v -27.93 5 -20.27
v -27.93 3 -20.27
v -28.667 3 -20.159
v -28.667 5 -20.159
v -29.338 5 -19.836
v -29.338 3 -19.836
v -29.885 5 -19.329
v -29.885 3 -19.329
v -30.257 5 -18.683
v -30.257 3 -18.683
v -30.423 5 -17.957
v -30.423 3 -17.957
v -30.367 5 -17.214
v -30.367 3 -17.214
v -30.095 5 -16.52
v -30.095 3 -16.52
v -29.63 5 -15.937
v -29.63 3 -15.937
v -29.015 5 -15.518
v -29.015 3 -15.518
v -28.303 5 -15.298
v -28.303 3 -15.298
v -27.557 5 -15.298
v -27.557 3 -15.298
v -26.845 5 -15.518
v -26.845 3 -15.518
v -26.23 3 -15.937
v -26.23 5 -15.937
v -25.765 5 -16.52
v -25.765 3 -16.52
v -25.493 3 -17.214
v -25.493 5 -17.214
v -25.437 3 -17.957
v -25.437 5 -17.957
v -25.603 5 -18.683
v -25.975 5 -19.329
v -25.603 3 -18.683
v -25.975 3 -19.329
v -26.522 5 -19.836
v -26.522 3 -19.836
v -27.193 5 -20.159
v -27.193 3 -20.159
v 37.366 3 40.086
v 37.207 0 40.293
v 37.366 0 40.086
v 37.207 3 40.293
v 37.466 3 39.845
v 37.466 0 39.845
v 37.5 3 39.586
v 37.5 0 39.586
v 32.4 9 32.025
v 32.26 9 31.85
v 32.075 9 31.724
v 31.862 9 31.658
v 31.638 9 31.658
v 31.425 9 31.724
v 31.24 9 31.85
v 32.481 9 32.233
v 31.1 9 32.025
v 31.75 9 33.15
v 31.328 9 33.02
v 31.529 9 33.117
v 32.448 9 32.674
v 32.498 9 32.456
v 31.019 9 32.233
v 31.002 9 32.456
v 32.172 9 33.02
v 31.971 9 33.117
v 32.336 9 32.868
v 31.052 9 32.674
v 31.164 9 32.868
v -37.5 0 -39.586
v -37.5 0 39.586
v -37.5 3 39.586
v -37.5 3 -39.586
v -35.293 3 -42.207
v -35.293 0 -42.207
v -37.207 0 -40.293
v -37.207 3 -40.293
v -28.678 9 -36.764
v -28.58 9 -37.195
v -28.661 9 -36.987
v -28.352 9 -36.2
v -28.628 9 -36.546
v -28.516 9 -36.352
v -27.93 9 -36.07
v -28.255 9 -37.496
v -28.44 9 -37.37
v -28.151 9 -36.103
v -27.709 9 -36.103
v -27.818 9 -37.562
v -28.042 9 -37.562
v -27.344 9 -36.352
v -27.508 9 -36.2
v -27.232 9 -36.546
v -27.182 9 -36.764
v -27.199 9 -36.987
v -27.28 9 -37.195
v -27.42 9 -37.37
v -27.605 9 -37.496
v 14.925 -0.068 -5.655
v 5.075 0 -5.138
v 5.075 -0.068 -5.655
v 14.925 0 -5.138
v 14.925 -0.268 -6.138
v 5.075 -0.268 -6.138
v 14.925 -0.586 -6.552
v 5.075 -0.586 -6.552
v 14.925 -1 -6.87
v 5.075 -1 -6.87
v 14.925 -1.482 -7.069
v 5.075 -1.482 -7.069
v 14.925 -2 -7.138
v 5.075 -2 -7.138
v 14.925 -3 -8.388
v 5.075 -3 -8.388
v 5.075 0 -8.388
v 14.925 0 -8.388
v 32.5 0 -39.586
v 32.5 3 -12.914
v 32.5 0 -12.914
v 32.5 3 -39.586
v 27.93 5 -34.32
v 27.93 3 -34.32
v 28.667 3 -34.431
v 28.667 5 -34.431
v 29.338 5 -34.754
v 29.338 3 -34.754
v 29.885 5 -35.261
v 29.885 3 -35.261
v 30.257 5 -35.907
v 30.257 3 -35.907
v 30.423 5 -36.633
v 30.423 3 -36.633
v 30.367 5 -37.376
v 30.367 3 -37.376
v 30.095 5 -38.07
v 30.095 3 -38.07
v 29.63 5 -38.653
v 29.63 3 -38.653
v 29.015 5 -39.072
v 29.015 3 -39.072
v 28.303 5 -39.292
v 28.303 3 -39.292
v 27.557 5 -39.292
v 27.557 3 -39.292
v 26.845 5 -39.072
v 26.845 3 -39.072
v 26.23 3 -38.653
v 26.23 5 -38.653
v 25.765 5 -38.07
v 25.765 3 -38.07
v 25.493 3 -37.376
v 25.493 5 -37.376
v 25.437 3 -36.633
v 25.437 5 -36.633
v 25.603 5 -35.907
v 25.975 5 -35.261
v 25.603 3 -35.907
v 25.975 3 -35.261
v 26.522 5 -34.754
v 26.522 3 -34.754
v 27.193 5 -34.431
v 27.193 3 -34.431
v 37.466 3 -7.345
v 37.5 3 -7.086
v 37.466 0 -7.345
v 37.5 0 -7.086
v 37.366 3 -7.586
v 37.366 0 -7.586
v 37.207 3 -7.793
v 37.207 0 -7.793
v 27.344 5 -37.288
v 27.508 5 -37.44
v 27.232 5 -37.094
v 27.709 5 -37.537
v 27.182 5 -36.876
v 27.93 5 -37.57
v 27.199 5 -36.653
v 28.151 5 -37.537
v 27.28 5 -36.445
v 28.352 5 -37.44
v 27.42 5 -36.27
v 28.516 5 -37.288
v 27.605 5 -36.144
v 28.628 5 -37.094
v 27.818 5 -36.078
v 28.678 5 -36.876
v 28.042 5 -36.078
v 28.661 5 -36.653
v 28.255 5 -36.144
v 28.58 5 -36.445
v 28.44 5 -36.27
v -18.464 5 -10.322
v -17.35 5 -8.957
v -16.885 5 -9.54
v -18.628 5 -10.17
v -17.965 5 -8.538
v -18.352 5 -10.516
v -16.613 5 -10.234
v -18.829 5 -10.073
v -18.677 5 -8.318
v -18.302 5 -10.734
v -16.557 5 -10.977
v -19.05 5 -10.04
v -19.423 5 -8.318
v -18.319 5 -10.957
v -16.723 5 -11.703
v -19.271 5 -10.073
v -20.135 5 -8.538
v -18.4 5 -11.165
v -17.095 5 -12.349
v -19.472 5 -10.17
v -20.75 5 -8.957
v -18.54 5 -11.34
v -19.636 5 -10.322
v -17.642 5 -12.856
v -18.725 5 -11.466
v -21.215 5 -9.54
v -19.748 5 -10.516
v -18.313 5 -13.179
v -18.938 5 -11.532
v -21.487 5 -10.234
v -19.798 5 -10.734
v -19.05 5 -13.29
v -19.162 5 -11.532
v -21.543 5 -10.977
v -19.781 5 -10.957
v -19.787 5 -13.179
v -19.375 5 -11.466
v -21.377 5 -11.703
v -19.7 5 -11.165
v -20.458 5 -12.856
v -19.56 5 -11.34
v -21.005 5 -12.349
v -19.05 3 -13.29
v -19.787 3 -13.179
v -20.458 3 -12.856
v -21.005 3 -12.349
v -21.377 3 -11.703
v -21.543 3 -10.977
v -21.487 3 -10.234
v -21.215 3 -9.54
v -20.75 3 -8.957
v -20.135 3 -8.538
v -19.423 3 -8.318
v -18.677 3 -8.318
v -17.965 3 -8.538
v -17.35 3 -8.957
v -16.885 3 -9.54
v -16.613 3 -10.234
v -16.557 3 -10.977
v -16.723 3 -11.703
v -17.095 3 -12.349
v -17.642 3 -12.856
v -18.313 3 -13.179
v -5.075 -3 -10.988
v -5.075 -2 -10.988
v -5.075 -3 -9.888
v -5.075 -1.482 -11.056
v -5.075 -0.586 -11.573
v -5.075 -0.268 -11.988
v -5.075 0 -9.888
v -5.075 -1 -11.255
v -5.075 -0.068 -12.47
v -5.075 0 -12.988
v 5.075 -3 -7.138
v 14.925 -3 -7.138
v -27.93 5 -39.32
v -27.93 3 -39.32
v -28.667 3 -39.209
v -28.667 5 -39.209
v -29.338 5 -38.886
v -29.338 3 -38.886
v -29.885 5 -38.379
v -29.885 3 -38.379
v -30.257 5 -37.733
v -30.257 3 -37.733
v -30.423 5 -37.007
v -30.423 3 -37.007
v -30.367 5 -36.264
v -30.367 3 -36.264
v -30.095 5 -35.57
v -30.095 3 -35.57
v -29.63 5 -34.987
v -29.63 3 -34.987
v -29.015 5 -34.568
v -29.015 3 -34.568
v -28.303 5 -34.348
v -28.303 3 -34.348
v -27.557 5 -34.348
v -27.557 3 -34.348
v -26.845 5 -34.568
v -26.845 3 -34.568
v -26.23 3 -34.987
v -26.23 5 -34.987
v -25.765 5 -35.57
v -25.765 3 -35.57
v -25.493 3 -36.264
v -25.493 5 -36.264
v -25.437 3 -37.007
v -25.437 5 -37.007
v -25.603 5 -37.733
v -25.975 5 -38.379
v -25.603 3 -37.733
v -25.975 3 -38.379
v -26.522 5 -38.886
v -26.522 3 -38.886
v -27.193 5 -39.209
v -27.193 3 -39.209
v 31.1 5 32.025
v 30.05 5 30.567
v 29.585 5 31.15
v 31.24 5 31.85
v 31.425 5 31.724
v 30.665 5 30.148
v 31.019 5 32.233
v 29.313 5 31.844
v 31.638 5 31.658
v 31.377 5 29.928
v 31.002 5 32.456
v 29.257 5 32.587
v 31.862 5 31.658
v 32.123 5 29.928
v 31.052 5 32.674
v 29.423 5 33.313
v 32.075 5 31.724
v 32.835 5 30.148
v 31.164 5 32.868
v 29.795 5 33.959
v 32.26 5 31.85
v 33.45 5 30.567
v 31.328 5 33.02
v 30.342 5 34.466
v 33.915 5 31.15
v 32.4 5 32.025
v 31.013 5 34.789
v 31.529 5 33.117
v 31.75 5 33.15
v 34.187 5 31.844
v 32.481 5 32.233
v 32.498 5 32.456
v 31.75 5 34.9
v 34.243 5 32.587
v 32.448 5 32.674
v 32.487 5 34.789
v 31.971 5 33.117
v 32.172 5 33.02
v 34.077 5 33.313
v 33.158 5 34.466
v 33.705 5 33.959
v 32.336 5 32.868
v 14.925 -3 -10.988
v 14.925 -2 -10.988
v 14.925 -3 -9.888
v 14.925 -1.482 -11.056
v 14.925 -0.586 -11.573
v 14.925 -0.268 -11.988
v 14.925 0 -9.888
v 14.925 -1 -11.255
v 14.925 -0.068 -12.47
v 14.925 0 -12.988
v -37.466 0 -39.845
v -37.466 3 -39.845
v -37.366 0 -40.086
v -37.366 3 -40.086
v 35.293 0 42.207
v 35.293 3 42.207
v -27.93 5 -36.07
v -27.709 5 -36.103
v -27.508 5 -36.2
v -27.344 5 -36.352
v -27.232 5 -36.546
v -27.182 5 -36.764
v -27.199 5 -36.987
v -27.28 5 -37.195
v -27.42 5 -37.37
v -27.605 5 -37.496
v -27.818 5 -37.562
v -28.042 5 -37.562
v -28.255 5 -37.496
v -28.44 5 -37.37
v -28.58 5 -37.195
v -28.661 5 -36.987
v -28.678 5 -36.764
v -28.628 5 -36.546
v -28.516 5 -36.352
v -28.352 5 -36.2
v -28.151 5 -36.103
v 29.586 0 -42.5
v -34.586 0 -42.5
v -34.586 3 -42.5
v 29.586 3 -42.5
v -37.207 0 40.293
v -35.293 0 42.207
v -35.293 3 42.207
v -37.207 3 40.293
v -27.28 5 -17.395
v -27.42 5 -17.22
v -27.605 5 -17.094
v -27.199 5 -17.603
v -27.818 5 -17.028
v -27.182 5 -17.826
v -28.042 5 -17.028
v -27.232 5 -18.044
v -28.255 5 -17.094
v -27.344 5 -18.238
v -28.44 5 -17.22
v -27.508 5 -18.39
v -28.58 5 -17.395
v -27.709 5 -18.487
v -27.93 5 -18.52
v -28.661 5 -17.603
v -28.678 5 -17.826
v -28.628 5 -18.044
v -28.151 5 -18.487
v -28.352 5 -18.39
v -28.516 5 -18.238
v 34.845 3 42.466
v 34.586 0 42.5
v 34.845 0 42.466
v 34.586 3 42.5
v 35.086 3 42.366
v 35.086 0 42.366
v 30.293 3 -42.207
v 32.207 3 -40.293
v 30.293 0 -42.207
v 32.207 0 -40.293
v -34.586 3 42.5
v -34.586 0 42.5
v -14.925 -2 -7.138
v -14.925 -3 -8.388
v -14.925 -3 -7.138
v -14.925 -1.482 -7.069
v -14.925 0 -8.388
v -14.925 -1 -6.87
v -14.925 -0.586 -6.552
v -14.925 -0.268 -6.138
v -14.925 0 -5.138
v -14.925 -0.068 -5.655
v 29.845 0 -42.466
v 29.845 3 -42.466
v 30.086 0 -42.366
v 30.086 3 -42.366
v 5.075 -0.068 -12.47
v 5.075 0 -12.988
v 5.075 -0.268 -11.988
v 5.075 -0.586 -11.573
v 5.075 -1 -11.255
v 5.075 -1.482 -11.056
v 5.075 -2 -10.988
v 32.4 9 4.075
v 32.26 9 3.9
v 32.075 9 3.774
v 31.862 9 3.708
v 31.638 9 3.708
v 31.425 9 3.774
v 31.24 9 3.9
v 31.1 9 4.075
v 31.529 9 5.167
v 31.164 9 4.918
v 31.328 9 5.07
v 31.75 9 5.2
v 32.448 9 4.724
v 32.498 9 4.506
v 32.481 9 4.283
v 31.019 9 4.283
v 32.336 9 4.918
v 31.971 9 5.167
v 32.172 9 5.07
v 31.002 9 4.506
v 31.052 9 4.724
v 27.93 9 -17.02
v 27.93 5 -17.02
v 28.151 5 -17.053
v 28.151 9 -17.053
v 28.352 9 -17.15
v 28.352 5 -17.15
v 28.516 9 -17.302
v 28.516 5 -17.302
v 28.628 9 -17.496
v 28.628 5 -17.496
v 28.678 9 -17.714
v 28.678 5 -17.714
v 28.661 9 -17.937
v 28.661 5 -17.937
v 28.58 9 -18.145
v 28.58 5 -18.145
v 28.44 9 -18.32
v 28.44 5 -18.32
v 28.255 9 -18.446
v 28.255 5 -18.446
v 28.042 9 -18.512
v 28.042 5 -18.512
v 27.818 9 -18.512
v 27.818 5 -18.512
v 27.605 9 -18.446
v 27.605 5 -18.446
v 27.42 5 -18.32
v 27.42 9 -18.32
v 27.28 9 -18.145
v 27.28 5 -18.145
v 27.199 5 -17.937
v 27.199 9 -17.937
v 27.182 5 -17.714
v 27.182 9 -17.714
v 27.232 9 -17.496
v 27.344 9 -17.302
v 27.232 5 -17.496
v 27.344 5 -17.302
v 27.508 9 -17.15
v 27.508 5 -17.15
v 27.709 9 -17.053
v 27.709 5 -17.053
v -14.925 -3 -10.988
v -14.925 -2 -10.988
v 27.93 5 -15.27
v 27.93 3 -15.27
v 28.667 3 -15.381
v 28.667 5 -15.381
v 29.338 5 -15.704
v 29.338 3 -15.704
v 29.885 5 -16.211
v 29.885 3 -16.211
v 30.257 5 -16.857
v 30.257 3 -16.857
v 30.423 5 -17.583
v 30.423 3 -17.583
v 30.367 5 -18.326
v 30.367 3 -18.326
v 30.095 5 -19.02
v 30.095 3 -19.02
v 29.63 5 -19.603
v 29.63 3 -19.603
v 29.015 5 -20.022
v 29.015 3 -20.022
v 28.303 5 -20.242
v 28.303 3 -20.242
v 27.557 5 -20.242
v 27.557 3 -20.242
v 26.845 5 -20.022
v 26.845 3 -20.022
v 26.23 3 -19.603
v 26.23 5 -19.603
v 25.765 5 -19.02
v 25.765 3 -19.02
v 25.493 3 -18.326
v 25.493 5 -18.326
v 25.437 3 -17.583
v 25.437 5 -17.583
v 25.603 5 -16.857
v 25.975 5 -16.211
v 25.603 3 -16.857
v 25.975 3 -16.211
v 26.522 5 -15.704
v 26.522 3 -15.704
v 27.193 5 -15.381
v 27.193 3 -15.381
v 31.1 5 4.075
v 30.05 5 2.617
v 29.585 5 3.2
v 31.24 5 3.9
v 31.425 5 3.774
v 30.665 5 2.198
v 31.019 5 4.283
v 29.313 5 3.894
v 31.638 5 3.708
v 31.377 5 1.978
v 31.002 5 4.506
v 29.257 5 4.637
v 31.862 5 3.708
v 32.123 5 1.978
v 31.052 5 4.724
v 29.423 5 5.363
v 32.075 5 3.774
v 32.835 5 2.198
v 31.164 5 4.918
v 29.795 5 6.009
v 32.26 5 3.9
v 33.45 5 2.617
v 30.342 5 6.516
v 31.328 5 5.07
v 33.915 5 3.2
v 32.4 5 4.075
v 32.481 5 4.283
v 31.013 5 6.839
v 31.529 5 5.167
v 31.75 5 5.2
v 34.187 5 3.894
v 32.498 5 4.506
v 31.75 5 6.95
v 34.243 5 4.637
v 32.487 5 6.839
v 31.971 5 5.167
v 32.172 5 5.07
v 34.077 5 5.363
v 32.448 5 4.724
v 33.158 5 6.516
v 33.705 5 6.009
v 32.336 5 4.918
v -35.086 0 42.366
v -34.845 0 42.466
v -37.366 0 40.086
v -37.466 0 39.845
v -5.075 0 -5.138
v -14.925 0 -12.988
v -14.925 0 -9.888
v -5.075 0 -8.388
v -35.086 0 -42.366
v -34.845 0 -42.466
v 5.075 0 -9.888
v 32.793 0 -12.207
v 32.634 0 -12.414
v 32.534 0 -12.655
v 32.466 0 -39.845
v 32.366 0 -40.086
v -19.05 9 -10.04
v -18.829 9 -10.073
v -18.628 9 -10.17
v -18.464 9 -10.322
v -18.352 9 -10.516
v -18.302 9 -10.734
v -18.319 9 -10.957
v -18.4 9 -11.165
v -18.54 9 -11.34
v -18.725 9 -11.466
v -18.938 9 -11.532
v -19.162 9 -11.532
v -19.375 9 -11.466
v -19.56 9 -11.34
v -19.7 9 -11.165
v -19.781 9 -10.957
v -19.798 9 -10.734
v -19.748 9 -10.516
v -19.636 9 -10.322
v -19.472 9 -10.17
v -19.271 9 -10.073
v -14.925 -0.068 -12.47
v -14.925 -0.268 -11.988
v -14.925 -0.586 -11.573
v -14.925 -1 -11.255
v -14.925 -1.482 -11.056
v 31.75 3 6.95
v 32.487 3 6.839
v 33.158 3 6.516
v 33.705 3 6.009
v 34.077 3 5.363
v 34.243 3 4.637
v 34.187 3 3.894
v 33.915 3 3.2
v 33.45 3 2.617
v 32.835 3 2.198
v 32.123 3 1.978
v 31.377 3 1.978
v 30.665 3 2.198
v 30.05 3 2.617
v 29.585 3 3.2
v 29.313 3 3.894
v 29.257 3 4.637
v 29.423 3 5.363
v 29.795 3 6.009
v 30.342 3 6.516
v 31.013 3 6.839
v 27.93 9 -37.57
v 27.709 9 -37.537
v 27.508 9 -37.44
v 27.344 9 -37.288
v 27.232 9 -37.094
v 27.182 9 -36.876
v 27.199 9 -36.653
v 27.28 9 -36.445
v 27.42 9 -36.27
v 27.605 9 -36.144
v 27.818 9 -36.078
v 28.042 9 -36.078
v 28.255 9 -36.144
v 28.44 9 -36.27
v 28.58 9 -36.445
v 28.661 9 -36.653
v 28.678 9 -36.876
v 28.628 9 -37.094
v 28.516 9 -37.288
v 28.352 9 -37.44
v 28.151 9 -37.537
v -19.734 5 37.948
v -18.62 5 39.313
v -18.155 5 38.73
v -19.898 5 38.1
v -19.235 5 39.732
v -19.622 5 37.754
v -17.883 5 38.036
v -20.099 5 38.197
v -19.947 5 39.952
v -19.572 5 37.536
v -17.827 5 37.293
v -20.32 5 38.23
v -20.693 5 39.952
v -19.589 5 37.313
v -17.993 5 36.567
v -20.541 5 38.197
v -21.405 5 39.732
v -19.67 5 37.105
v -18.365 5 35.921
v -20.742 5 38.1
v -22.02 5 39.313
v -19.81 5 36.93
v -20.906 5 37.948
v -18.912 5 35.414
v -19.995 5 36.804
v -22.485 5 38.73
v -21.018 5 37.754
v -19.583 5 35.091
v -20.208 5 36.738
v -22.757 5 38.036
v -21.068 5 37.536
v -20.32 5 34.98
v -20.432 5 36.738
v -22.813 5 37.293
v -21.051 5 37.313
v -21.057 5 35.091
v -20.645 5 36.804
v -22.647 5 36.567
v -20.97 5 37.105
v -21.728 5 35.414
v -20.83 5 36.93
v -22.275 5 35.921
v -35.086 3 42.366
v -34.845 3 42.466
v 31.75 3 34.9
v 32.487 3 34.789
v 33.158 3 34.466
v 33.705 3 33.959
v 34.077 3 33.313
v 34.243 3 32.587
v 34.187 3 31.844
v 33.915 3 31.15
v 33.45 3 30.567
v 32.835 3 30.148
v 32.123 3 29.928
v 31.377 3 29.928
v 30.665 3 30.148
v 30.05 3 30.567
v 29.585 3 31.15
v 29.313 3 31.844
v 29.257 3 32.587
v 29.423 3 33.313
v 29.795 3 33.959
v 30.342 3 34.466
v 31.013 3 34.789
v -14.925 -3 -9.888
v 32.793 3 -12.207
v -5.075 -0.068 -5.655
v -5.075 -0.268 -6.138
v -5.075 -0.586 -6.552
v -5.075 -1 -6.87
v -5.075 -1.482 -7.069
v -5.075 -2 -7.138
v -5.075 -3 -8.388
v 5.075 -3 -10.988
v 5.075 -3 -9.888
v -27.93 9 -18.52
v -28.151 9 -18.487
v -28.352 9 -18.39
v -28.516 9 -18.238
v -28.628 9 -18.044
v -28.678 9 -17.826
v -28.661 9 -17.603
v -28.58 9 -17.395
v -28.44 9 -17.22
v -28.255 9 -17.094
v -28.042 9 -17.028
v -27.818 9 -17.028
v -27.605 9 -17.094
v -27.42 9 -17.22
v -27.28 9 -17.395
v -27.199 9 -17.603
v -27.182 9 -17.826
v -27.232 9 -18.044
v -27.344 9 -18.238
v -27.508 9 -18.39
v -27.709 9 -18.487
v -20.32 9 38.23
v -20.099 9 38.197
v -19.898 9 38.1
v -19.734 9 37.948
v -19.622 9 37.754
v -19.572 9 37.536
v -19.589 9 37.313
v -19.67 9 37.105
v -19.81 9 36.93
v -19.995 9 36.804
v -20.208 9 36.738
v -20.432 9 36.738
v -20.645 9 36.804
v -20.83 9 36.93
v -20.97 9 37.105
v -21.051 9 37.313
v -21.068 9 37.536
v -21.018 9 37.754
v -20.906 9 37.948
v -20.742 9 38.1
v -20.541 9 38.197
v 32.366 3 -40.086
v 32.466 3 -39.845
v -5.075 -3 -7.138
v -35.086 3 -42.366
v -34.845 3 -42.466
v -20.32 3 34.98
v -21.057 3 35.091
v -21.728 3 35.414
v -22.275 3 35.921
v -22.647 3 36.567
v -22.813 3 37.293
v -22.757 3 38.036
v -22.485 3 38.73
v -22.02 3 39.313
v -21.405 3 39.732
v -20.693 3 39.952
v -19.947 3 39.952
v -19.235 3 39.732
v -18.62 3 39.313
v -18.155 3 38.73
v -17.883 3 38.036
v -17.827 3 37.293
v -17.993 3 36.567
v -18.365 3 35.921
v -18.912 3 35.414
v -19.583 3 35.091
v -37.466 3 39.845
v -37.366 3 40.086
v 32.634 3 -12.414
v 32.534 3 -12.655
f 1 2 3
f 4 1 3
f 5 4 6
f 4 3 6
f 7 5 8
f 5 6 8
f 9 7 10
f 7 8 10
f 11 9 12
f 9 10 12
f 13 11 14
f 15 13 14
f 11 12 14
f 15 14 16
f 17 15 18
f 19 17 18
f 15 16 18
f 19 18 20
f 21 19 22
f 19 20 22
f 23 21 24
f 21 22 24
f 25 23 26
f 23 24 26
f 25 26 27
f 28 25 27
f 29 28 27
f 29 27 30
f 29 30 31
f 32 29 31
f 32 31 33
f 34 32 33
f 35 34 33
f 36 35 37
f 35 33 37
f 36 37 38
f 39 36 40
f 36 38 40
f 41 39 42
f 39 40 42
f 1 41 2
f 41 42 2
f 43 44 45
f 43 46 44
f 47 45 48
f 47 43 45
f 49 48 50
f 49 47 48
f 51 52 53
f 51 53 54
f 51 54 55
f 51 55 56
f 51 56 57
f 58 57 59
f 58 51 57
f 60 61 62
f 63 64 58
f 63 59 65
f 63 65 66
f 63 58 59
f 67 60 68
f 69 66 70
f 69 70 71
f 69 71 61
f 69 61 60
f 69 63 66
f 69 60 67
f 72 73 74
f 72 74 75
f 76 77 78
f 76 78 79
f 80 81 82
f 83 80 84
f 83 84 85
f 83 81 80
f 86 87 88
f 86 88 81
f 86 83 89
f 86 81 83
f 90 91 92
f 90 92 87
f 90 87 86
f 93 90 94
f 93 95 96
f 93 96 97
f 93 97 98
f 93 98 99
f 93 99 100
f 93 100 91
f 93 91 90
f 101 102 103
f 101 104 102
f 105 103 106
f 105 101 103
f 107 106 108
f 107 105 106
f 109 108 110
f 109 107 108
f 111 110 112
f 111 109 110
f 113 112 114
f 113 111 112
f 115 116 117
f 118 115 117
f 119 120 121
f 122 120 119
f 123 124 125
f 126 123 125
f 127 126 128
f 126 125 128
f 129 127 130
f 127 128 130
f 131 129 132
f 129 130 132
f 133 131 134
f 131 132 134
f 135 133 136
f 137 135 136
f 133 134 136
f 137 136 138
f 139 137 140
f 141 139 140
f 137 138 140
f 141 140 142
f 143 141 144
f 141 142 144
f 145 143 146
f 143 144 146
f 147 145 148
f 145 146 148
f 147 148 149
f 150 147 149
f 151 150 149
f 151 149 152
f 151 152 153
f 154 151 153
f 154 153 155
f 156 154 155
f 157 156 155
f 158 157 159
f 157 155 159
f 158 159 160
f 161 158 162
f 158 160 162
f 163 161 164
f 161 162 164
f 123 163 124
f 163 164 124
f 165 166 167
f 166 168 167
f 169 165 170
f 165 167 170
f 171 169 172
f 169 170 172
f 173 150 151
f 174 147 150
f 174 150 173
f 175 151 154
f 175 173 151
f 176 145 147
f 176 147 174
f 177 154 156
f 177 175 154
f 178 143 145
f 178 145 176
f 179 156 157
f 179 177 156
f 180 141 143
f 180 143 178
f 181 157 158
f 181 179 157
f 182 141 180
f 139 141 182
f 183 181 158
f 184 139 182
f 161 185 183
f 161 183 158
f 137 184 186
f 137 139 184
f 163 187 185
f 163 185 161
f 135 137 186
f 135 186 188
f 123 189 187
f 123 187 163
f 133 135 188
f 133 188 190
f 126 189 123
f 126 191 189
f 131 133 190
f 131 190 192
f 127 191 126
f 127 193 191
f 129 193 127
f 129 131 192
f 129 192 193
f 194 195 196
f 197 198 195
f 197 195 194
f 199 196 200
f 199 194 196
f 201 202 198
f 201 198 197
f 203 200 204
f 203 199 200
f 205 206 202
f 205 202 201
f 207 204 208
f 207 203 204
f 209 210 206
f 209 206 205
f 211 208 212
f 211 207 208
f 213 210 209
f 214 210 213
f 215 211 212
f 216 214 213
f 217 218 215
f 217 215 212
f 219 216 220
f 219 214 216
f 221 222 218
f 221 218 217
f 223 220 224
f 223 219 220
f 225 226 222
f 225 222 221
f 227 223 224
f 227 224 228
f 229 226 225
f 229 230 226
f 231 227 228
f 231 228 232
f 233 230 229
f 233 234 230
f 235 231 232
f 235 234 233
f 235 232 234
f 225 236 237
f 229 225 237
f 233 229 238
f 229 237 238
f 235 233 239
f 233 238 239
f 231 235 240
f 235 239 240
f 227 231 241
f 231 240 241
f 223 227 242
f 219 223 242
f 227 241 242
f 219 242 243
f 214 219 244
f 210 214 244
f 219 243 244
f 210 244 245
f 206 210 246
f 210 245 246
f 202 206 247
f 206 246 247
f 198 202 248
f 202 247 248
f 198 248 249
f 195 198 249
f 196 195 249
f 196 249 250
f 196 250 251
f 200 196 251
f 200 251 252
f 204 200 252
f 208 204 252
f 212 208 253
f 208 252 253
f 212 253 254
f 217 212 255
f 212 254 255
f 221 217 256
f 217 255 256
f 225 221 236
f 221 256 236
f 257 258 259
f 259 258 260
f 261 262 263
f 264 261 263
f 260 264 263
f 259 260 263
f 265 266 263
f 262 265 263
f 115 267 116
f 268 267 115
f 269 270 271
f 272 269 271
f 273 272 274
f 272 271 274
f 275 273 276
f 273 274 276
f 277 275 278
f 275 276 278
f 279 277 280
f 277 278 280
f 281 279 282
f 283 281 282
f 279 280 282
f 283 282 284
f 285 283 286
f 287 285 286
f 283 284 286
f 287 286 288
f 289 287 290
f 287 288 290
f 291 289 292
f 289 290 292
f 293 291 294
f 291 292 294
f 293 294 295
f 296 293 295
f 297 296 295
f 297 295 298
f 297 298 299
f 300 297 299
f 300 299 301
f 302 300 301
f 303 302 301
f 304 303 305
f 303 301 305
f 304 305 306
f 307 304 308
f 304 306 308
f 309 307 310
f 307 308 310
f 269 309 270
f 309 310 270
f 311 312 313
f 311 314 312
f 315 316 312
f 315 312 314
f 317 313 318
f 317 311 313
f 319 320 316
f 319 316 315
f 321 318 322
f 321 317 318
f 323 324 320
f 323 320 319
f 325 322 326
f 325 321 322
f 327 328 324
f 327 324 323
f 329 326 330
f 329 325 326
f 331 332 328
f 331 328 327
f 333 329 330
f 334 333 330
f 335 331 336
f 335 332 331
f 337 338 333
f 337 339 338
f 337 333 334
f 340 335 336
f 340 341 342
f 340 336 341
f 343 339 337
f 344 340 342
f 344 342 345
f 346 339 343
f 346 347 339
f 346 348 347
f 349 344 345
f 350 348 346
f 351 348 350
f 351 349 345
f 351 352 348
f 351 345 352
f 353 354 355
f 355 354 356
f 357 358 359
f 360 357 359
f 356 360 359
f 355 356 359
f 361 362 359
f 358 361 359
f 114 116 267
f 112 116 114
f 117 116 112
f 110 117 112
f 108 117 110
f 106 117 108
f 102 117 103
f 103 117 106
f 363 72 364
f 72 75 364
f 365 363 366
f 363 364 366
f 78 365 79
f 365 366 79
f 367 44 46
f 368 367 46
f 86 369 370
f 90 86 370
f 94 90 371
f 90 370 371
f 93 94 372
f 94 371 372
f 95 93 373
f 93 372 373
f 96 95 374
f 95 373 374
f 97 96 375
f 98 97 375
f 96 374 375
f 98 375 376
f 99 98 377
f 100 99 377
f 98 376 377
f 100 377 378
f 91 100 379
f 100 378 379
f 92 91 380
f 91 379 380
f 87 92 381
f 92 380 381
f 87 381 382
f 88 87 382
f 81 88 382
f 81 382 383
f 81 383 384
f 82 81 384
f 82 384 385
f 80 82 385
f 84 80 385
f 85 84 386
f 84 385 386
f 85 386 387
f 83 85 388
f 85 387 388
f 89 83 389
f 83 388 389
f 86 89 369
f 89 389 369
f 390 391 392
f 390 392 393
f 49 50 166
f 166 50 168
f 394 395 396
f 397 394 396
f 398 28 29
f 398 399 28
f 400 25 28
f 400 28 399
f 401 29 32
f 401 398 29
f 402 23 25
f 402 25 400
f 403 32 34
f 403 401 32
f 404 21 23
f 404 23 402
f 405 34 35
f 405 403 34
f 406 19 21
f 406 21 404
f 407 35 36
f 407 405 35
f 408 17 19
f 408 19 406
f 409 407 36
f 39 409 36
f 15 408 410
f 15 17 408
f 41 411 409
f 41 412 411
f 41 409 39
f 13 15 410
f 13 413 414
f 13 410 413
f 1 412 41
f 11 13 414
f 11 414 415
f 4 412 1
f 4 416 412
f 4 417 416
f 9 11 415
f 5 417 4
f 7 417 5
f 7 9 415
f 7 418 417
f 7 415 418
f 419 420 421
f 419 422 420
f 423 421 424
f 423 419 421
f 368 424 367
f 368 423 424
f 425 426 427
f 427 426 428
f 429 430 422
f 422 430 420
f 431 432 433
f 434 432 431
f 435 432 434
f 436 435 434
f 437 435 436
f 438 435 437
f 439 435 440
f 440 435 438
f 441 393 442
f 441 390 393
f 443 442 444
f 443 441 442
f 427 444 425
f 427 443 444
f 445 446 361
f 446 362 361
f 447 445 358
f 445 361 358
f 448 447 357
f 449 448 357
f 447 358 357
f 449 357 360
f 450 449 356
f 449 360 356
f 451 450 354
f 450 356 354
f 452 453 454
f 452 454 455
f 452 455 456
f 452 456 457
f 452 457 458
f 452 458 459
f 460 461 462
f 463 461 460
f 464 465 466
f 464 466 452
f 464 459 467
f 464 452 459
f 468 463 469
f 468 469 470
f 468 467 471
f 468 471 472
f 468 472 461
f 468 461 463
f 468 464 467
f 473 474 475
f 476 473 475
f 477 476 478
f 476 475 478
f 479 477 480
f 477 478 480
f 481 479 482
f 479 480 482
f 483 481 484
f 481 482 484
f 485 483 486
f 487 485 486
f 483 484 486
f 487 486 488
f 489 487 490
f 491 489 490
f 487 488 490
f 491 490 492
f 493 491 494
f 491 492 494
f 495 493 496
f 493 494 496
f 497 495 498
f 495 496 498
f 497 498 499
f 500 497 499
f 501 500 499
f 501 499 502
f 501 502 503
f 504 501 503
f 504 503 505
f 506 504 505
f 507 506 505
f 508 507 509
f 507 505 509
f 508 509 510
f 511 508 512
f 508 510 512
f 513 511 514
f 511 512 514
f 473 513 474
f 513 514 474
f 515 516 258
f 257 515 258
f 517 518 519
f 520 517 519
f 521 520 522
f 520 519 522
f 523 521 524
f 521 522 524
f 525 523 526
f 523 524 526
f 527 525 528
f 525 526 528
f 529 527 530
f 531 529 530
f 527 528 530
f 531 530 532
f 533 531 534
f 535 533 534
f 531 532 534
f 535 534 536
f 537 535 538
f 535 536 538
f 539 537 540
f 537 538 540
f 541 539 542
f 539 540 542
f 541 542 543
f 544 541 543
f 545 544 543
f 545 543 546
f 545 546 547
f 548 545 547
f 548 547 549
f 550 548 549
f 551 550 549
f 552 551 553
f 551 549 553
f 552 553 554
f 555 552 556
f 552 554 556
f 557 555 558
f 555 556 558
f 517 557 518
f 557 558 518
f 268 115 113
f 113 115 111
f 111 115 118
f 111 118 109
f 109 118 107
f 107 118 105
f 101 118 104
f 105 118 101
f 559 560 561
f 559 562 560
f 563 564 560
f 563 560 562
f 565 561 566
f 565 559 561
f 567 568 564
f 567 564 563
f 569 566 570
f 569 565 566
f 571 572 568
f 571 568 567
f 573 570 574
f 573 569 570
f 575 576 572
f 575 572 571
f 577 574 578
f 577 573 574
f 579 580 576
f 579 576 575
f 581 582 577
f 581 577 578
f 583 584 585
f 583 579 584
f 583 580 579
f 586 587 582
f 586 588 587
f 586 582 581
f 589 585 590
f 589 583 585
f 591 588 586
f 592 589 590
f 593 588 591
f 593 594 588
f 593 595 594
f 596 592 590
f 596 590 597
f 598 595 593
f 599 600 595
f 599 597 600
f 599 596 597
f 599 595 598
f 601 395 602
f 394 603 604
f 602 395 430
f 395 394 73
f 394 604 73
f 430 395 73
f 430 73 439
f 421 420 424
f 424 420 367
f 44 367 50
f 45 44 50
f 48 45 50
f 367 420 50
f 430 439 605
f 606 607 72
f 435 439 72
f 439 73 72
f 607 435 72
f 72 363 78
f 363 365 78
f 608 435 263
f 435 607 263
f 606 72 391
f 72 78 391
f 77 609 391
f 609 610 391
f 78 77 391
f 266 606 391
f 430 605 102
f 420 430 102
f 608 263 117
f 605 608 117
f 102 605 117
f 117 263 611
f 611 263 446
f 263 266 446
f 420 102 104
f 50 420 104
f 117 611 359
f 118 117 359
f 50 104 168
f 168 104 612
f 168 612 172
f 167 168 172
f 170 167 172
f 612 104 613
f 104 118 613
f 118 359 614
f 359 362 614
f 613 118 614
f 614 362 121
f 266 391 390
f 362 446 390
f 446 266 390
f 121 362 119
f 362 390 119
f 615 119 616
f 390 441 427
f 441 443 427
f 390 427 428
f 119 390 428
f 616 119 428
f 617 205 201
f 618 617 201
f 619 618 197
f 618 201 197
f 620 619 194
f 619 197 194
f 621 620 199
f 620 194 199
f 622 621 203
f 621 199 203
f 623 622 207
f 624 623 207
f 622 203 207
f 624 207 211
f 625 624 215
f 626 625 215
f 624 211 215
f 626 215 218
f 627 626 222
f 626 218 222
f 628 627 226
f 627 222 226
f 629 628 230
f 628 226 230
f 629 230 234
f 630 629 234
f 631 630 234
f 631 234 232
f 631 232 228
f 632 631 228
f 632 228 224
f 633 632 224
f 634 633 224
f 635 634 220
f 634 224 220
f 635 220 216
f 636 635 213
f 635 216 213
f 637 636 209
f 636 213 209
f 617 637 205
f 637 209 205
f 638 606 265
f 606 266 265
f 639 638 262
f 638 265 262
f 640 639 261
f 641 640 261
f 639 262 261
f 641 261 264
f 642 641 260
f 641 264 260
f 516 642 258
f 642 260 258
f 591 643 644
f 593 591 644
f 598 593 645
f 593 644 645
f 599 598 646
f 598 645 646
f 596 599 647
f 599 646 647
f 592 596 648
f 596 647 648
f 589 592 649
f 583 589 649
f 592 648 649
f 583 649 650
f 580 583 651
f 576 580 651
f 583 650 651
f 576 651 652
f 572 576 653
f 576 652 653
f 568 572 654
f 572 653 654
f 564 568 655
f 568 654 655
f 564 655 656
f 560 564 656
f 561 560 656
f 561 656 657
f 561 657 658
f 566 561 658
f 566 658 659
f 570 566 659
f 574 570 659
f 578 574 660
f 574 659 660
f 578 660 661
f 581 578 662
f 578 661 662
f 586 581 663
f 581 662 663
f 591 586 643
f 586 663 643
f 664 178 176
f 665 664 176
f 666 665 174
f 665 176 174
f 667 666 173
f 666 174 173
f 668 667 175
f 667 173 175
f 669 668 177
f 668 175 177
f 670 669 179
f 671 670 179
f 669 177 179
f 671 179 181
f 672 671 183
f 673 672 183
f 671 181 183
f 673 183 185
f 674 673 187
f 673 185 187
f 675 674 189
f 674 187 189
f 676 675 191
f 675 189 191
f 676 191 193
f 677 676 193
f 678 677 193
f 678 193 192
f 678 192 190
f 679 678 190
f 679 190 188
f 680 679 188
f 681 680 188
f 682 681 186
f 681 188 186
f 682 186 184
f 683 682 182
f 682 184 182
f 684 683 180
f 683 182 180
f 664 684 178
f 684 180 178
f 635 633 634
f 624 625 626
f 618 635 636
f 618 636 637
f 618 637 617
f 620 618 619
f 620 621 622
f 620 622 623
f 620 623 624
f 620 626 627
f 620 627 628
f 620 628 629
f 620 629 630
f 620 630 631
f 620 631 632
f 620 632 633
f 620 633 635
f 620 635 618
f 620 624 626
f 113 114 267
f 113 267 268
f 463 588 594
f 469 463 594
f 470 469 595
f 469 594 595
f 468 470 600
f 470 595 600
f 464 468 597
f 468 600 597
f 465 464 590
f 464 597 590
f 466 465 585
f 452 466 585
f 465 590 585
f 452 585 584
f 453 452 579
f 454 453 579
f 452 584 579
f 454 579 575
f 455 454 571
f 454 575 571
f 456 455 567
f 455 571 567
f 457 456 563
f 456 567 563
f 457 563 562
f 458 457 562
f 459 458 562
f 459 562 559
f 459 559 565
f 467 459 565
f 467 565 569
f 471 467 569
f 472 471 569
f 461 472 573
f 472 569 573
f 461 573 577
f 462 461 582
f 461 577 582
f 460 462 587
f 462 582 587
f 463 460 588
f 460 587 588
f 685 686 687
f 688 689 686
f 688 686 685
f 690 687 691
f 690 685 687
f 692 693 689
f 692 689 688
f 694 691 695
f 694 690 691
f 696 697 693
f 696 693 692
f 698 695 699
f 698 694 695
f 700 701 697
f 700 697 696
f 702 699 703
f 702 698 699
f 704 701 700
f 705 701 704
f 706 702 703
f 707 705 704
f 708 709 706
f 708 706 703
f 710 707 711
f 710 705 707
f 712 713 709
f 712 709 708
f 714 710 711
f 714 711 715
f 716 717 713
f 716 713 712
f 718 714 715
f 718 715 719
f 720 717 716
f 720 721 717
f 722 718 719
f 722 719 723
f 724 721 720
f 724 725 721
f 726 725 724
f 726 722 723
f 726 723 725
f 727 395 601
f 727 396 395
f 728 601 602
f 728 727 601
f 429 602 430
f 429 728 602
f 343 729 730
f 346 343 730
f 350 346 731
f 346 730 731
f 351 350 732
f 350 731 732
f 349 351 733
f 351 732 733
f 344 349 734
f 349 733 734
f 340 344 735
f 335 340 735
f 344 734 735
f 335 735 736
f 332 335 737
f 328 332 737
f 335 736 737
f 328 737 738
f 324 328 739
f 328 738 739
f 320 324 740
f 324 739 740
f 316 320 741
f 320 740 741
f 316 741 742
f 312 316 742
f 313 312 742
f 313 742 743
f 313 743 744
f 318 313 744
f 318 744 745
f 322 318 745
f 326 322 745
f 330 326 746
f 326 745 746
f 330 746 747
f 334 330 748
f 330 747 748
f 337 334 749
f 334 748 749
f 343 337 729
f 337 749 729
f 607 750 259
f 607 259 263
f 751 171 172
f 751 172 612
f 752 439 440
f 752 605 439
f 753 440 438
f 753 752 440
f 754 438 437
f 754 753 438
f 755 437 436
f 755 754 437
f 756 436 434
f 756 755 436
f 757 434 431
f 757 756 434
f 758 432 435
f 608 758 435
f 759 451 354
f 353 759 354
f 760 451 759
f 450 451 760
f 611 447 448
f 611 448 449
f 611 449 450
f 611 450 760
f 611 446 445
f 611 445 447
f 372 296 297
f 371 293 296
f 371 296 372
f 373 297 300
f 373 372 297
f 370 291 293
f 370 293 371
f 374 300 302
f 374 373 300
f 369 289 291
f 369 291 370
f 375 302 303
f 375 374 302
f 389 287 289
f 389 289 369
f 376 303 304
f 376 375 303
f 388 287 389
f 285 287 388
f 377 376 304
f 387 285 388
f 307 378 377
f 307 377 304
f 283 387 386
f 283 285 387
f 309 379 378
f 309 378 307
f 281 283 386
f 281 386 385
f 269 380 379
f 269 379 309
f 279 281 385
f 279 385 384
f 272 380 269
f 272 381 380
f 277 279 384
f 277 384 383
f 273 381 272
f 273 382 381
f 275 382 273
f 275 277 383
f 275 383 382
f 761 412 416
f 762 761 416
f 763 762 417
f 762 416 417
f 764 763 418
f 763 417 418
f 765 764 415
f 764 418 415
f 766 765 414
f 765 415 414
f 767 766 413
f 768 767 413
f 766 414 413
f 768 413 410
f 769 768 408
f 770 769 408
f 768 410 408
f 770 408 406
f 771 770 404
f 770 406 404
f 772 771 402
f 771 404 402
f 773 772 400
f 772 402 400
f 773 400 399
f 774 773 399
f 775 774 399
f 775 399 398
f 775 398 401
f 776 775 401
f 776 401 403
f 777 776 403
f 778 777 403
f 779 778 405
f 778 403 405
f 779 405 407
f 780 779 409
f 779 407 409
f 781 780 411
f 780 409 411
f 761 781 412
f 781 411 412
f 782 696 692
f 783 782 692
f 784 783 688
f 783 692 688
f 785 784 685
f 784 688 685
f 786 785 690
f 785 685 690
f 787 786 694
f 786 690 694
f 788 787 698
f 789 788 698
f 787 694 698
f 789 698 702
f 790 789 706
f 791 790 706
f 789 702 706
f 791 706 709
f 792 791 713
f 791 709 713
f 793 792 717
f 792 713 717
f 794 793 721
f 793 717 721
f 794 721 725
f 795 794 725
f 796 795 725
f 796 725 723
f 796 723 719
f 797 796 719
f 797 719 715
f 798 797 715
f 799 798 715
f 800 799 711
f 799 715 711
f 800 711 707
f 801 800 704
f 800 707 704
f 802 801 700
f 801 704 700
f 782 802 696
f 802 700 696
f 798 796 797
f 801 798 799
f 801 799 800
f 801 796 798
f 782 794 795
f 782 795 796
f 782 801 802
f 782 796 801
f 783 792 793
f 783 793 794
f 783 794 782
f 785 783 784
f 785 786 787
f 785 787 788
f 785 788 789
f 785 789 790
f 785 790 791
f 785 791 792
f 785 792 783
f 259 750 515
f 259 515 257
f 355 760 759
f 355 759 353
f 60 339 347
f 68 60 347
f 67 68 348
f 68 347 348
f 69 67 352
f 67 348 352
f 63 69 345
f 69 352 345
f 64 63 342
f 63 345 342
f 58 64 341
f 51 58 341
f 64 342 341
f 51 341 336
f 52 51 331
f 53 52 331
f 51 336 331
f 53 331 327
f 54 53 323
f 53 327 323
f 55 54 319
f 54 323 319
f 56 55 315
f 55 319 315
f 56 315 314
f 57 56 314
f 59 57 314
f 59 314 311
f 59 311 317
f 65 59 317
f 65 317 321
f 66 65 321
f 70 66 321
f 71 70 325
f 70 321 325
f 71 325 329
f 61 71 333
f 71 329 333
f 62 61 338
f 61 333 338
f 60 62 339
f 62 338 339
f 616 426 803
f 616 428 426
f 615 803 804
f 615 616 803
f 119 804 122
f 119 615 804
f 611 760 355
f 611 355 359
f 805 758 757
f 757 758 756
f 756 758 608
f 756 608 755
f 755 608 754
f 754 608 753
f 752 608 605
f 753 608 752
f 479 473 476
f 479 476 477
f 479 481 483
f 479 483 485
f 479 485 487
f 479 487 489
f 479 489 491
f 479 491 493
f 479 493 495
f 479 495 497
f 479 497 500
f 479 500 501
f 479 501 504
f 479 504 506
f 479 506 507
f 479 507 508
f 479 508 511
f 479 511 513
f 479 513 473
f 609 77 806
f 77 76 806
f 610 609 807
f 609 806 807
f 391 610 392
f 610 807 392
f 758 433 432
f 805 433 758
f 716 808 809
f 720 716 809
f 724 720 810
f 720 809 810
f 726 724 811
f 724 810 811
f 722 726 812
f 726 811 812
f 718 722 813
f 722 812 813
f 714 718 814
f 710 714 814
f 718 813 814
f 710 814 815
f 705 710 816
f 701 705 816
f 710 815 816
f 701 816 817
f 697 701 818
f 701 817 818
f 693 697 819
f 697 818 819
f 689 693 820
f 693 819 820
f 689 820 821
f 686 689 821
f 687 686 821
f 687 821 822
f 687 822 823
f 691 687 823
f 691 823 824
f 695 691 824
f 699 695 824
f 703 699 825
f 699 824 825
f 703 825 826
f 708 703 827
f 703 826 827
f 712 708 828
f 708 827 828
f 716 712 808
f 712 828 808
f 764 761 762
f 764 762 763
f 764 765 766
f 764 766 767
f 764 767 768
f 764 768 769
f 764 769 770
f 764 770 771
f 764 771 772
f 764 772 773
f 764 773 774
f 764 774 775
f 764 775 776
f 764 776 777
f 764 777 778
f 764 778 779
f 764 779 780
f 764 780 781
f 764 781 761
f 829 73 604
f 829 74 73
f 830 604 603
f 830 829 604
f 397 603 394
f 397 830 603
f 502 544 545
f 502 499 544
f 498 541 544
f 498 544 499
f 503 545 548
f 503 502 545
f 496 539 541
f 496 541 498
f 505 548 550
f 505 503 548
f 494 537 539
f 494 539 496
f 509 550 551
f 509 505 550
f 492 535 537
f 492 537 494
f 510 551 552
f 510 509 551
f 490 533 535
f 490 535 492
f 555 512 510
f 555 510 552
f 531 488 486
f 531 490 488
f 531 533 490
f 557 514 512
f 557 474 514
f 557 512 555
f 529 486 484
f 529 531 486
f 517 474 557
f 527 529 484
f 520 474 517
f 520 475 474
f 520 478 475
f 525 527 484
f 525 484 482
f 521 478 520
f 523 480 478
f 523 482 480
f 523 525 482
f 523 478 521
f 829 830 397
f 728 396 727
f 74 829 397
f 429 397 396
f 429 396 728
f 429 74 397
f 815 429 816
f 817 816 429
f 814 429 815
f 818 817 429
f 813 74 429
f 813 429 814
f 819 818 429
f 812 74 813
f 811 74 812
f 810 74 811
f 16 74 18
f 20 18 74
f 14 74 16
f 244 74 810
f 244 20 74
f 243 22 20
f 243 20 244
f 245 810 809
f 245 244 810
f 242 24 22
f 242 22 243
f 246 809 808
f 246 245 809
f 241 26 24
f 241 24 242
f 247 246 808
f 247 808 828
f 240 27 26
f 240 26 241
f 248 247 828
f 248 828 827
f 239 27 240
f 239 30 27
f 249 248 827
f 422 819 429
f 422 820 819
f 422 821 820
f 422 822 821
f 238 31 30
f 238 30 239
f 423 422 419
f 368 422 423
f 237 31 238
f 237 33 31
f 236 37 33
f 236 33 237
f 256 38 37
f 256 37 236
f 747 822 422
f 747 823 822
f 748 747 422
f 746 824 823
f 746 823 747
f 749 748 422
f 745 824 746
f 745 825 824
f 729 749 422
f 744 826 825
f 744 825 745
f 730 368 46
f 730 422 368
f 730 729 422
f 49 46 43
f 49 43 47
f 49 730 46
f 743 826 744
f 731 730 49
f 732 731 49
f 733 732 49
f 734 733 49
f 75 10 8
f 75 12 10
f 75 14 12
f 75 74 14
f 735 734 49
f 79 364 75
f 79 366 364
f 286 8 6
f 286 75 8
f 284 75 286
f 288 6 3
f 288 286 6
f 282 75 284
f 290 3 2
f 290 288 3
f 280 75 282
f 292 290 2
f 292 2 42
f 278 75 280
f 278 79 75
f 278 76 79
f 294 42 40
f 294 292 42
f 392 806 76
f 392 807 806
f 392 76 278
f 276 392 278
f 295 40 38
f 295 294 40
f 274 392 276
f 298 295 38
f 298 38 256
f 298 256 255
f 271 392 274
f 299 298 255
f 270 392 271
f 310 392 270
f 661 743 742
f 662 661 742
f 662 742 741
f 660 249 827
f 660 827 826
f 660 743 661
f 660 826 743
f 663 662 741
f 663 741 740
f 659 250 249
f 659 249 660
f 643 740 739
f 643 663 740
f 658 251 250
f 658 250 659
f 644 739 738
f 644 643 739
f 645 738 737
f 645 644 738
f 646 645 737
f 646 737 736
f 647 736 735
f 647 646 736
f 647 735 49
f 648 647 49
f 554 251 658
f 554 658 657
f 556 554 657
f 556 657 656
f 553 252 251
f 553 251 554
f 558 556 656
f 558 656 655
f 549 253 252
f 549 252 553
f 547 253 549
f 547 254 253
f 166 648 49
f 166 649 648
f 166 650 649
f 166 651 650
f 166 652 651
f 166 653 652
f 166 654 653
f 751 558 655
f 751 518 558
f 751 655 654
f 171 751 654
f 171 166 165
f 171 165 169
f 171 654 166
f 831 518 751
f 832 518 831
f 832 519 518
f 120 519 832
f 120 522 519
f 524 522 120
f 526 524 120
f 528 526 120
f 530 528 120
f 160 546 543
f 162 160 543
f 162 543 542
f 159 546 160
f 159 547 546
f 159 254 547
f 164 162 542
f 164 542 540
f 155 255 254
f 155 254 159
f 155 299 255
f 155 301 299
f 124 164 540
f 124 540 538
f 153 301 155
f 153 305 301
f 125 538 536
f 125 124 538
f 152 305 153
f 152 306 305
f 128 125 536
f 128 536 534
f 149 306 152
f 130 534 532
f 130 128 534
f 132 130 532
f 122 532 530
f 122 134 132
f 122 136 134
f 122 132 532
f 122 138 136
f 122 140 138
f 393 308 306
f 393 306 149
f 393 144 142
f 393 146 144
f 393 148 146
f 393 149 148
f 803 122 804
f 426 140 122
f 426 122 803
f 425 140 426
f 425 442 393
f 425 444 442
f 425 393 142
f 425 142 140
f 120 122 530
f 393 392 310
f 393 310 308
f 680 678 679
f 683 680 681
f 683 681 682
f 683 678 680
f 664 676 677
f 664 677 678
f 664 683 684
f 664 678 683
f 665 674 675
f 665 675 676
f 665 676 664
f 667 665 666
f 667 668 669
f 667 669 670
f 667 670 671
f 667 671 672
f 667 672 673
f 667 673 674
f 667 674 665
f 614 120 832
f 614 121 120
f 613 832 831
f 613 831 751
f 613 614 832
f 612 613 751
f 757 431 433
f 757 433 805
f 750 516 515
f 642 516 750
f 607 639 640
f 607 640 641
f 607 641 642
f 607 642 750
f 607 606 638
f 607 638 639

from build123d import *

# Parameters (mm, degrees)
SKETCH1_W           = 75
SKETCH1_H           = 85
BOSS_EXTRUDE1_DEPTH = 3
SKETCH2_R           = 2.5
BOSS_EXTRUDE2_DEPTH = 2
SKETCH3_R           = 0.75
BOSS_EXTRUDE3_DEPTH = 4
CUT_EXTRUDE1_REACH  = 58.996
CHAMFER3_SIZE       = 2.5
FILLET2_R           = 1
SKETCH5_W           = 9.85
SKETCH5_H           = 3.85
BOSS_EXTRUDE4_DEPTH = 3
FILLET3_R           = 2
SKETCH6_W           = 1.5
SKETCH6_H           = 3
CUT_EXTRUDE2_DEPTH  = 69.085465593


with BuildPart() as part:
    # Sketch1 → Boss-Extrude1 (new body)
    with BuildSketch(Plane(origin=(0, 0, 0), x_dir=(1, 0, 0), z_dir=(0, 1, 0))):
        Rectangle(SKETCH1_W, SKETCH1_H)
    extrude(amount=BOSS_EXTRUDE1_DEPTH)

    # Sketch2 → Boss-Extrude2 (add)
    with BuildSketch(Plane(origin=(0, 3, 0), x_dir=(1, 0, 0), z_dir=(0, 1, 0))):
        with Locations(Location((27.93, 36.82, 0), (0, 0, 270))):
            Circle(SKETCH2_R)
        with Locations(Location((27.93, 17.77, 0), (0, 0, 270))):
            Circle(SKETCH2_R)
        with Locations(Location((-27.93, 17.77, 0), (0, 0, 90))):
            Circle(SKETCH2_R)
        with Locations(Location((-27.93, 36.82, 0), (0, 0, 90))):
            Circle(SKETCH2_R)
        with Locations(Location((-19.05, 10.79, 0), (0, 0, 90))):
            Circle(SKETCH2_R)
        with Locations(Location((-20.32, -37.48, 0), (0, 0, 90))):
            Circle(SKETCH2_R)
        with Locations(Location((31.75, -4.45, 0), (0, 0, 270))):
            Circle(SKETCH2_R)
        with Locations(Location((31.75, -32.4, 0), (0, 0, 270))):
            Circle(SKETCH2_R)
    extrude(amount=BOSS_EXTRUDE2_DEPTH)

    # Sketch3 → Boss-Extrude3 (add)
    with BuildSketch(Plane(origin=(0, 5, 0), x_dir=(1, 0, 0), z_dir=(0, 1, 0))):
        with Locations(Location((-27.93, 36.82, 0), (0, 0, 270))):
            Circle(SKETCH3_R)
        with Locations(Location((27.93, 36.82, 0), (0, 0, 90))):
            Circle(SKETCH3_R)
        with Locations(Location((27.93, 17.77, 0), (0, 0, 270))):
            Circle(SKETCH3_R)
        with Locations(Location((-27.93, 17.77, 0), (0, 0, 90))):
            Circle(SKETCH3_R)
        with Locations(Location((-19.05, 10.79, 0), (0, 0, 270))):
            Circle(SKETCH3_R)
        with Locations(Location((31.75, -4.45, 0), (0, 0, 270))):
            Circle(SKETCH3_R)
        with Locations(Location((-20.32, -37.48, 0), (0, 0, 270))):
            Circle(SKETCH3_R)
        with Locations(Location((31.75, -32.4, 0), (0, 0, 270))):
            Circle(SKETCH3_R)
    extrude(amount=BOSS_EXTRUDE3_DEPTH)

    # Sketch4 → Cut-Extrude1 (cut, up to next)
    with BuildSketch(Plane(origin=(0, 3, 0), x_dir=(1, 0, 0), z_dir=(0, 1, 0)), mode=Mode.PRIVATE) as cut_extrude1_sk1:
        Polygon((37.5, 7.5), (32.5, 12.5), (32.5, 42.5), (37.5, 42.5), align=None)
    cut_extrude1_tool1 = extrude(cut_extrude1_sk1.sketch, amount=-CUT_EXTRUDE1_REACH, mode=Mode.PRIVATE) & part.part
    add(cut_extrude1_tool1.solids().sort_by_distance((35.064103, 3, -26.217949))[0], mode=Mode.SUBTRACT)

    # Chamfer3
    chamfer3_edges = [part.edges().sort_by_distance(p)[0] for p in [
        (37.5, 1.5, 42.5),
        (-37.5, 1.5, 42.5),
        (-37.5, 1.5, -42.5),
        (32.5, 1.5, -42.5),
    ]]
    chamfer(chamfer3_edges, length=CHAMFER3_SIZE)

    # Fillet2
    fillet2_edges = [part.edges().sort_by_distance(p)[0] for p in [
        (-37.5, 1.5, -40),
        (-37.5, 1.5, 40),
        (37.5, 1.5, 40),
        (32.5, 1.5, -40),
        (-35, 1.5, -42.5),
        (30, 1.5, -42.5),
        (37.5, 1.5, -7.5),
        (32.5, 1.5, -12.5),
        (35, 1.5, 42.5),
        (-35, 1.5, 42.5),
    ]]
    fillet(fillet2_edges, radius=FILLET2_R)

    # Sketch5 → Boss-Extrude4 (add)
    with BuildSketch(Plane.XZ):
        with Locations((10, -9.0625)):
            Rectangle(SKETCH5_W, SKETCH5_H)
        with Locations((-10, -9.0625)):
            Rectangle(SKETCH5_W, SKETCH5_H)
    extrude(amount=BOSS_EXTRUDE4_DEPTH)

    # Fillet3
    fillet3_edges = [part.edges().sort_by_distance(p)[0] for p in [
        (10, 0, -7.1375),
        (10, 0, -10.9875),
        (-10, 0, -10.9875),
        (-10, 0, -7.1375),
    ]]
    fillet(fillet3_edges, radius=FILLET3_R)

    # Sketch6 → Cut-Extrude2 (cut, through all)
    with BuildSketch(Plane.ZY.offset(14.925)):
        with Locations((-9.1375, -1.5)):
            Rectangle(SKETCH6_W, SKETCH6_H)
    extrude(amount=-CUT_EXTRUDE2_DEPTH, mode=Mode.SUBTRACT)


solid = part.part
